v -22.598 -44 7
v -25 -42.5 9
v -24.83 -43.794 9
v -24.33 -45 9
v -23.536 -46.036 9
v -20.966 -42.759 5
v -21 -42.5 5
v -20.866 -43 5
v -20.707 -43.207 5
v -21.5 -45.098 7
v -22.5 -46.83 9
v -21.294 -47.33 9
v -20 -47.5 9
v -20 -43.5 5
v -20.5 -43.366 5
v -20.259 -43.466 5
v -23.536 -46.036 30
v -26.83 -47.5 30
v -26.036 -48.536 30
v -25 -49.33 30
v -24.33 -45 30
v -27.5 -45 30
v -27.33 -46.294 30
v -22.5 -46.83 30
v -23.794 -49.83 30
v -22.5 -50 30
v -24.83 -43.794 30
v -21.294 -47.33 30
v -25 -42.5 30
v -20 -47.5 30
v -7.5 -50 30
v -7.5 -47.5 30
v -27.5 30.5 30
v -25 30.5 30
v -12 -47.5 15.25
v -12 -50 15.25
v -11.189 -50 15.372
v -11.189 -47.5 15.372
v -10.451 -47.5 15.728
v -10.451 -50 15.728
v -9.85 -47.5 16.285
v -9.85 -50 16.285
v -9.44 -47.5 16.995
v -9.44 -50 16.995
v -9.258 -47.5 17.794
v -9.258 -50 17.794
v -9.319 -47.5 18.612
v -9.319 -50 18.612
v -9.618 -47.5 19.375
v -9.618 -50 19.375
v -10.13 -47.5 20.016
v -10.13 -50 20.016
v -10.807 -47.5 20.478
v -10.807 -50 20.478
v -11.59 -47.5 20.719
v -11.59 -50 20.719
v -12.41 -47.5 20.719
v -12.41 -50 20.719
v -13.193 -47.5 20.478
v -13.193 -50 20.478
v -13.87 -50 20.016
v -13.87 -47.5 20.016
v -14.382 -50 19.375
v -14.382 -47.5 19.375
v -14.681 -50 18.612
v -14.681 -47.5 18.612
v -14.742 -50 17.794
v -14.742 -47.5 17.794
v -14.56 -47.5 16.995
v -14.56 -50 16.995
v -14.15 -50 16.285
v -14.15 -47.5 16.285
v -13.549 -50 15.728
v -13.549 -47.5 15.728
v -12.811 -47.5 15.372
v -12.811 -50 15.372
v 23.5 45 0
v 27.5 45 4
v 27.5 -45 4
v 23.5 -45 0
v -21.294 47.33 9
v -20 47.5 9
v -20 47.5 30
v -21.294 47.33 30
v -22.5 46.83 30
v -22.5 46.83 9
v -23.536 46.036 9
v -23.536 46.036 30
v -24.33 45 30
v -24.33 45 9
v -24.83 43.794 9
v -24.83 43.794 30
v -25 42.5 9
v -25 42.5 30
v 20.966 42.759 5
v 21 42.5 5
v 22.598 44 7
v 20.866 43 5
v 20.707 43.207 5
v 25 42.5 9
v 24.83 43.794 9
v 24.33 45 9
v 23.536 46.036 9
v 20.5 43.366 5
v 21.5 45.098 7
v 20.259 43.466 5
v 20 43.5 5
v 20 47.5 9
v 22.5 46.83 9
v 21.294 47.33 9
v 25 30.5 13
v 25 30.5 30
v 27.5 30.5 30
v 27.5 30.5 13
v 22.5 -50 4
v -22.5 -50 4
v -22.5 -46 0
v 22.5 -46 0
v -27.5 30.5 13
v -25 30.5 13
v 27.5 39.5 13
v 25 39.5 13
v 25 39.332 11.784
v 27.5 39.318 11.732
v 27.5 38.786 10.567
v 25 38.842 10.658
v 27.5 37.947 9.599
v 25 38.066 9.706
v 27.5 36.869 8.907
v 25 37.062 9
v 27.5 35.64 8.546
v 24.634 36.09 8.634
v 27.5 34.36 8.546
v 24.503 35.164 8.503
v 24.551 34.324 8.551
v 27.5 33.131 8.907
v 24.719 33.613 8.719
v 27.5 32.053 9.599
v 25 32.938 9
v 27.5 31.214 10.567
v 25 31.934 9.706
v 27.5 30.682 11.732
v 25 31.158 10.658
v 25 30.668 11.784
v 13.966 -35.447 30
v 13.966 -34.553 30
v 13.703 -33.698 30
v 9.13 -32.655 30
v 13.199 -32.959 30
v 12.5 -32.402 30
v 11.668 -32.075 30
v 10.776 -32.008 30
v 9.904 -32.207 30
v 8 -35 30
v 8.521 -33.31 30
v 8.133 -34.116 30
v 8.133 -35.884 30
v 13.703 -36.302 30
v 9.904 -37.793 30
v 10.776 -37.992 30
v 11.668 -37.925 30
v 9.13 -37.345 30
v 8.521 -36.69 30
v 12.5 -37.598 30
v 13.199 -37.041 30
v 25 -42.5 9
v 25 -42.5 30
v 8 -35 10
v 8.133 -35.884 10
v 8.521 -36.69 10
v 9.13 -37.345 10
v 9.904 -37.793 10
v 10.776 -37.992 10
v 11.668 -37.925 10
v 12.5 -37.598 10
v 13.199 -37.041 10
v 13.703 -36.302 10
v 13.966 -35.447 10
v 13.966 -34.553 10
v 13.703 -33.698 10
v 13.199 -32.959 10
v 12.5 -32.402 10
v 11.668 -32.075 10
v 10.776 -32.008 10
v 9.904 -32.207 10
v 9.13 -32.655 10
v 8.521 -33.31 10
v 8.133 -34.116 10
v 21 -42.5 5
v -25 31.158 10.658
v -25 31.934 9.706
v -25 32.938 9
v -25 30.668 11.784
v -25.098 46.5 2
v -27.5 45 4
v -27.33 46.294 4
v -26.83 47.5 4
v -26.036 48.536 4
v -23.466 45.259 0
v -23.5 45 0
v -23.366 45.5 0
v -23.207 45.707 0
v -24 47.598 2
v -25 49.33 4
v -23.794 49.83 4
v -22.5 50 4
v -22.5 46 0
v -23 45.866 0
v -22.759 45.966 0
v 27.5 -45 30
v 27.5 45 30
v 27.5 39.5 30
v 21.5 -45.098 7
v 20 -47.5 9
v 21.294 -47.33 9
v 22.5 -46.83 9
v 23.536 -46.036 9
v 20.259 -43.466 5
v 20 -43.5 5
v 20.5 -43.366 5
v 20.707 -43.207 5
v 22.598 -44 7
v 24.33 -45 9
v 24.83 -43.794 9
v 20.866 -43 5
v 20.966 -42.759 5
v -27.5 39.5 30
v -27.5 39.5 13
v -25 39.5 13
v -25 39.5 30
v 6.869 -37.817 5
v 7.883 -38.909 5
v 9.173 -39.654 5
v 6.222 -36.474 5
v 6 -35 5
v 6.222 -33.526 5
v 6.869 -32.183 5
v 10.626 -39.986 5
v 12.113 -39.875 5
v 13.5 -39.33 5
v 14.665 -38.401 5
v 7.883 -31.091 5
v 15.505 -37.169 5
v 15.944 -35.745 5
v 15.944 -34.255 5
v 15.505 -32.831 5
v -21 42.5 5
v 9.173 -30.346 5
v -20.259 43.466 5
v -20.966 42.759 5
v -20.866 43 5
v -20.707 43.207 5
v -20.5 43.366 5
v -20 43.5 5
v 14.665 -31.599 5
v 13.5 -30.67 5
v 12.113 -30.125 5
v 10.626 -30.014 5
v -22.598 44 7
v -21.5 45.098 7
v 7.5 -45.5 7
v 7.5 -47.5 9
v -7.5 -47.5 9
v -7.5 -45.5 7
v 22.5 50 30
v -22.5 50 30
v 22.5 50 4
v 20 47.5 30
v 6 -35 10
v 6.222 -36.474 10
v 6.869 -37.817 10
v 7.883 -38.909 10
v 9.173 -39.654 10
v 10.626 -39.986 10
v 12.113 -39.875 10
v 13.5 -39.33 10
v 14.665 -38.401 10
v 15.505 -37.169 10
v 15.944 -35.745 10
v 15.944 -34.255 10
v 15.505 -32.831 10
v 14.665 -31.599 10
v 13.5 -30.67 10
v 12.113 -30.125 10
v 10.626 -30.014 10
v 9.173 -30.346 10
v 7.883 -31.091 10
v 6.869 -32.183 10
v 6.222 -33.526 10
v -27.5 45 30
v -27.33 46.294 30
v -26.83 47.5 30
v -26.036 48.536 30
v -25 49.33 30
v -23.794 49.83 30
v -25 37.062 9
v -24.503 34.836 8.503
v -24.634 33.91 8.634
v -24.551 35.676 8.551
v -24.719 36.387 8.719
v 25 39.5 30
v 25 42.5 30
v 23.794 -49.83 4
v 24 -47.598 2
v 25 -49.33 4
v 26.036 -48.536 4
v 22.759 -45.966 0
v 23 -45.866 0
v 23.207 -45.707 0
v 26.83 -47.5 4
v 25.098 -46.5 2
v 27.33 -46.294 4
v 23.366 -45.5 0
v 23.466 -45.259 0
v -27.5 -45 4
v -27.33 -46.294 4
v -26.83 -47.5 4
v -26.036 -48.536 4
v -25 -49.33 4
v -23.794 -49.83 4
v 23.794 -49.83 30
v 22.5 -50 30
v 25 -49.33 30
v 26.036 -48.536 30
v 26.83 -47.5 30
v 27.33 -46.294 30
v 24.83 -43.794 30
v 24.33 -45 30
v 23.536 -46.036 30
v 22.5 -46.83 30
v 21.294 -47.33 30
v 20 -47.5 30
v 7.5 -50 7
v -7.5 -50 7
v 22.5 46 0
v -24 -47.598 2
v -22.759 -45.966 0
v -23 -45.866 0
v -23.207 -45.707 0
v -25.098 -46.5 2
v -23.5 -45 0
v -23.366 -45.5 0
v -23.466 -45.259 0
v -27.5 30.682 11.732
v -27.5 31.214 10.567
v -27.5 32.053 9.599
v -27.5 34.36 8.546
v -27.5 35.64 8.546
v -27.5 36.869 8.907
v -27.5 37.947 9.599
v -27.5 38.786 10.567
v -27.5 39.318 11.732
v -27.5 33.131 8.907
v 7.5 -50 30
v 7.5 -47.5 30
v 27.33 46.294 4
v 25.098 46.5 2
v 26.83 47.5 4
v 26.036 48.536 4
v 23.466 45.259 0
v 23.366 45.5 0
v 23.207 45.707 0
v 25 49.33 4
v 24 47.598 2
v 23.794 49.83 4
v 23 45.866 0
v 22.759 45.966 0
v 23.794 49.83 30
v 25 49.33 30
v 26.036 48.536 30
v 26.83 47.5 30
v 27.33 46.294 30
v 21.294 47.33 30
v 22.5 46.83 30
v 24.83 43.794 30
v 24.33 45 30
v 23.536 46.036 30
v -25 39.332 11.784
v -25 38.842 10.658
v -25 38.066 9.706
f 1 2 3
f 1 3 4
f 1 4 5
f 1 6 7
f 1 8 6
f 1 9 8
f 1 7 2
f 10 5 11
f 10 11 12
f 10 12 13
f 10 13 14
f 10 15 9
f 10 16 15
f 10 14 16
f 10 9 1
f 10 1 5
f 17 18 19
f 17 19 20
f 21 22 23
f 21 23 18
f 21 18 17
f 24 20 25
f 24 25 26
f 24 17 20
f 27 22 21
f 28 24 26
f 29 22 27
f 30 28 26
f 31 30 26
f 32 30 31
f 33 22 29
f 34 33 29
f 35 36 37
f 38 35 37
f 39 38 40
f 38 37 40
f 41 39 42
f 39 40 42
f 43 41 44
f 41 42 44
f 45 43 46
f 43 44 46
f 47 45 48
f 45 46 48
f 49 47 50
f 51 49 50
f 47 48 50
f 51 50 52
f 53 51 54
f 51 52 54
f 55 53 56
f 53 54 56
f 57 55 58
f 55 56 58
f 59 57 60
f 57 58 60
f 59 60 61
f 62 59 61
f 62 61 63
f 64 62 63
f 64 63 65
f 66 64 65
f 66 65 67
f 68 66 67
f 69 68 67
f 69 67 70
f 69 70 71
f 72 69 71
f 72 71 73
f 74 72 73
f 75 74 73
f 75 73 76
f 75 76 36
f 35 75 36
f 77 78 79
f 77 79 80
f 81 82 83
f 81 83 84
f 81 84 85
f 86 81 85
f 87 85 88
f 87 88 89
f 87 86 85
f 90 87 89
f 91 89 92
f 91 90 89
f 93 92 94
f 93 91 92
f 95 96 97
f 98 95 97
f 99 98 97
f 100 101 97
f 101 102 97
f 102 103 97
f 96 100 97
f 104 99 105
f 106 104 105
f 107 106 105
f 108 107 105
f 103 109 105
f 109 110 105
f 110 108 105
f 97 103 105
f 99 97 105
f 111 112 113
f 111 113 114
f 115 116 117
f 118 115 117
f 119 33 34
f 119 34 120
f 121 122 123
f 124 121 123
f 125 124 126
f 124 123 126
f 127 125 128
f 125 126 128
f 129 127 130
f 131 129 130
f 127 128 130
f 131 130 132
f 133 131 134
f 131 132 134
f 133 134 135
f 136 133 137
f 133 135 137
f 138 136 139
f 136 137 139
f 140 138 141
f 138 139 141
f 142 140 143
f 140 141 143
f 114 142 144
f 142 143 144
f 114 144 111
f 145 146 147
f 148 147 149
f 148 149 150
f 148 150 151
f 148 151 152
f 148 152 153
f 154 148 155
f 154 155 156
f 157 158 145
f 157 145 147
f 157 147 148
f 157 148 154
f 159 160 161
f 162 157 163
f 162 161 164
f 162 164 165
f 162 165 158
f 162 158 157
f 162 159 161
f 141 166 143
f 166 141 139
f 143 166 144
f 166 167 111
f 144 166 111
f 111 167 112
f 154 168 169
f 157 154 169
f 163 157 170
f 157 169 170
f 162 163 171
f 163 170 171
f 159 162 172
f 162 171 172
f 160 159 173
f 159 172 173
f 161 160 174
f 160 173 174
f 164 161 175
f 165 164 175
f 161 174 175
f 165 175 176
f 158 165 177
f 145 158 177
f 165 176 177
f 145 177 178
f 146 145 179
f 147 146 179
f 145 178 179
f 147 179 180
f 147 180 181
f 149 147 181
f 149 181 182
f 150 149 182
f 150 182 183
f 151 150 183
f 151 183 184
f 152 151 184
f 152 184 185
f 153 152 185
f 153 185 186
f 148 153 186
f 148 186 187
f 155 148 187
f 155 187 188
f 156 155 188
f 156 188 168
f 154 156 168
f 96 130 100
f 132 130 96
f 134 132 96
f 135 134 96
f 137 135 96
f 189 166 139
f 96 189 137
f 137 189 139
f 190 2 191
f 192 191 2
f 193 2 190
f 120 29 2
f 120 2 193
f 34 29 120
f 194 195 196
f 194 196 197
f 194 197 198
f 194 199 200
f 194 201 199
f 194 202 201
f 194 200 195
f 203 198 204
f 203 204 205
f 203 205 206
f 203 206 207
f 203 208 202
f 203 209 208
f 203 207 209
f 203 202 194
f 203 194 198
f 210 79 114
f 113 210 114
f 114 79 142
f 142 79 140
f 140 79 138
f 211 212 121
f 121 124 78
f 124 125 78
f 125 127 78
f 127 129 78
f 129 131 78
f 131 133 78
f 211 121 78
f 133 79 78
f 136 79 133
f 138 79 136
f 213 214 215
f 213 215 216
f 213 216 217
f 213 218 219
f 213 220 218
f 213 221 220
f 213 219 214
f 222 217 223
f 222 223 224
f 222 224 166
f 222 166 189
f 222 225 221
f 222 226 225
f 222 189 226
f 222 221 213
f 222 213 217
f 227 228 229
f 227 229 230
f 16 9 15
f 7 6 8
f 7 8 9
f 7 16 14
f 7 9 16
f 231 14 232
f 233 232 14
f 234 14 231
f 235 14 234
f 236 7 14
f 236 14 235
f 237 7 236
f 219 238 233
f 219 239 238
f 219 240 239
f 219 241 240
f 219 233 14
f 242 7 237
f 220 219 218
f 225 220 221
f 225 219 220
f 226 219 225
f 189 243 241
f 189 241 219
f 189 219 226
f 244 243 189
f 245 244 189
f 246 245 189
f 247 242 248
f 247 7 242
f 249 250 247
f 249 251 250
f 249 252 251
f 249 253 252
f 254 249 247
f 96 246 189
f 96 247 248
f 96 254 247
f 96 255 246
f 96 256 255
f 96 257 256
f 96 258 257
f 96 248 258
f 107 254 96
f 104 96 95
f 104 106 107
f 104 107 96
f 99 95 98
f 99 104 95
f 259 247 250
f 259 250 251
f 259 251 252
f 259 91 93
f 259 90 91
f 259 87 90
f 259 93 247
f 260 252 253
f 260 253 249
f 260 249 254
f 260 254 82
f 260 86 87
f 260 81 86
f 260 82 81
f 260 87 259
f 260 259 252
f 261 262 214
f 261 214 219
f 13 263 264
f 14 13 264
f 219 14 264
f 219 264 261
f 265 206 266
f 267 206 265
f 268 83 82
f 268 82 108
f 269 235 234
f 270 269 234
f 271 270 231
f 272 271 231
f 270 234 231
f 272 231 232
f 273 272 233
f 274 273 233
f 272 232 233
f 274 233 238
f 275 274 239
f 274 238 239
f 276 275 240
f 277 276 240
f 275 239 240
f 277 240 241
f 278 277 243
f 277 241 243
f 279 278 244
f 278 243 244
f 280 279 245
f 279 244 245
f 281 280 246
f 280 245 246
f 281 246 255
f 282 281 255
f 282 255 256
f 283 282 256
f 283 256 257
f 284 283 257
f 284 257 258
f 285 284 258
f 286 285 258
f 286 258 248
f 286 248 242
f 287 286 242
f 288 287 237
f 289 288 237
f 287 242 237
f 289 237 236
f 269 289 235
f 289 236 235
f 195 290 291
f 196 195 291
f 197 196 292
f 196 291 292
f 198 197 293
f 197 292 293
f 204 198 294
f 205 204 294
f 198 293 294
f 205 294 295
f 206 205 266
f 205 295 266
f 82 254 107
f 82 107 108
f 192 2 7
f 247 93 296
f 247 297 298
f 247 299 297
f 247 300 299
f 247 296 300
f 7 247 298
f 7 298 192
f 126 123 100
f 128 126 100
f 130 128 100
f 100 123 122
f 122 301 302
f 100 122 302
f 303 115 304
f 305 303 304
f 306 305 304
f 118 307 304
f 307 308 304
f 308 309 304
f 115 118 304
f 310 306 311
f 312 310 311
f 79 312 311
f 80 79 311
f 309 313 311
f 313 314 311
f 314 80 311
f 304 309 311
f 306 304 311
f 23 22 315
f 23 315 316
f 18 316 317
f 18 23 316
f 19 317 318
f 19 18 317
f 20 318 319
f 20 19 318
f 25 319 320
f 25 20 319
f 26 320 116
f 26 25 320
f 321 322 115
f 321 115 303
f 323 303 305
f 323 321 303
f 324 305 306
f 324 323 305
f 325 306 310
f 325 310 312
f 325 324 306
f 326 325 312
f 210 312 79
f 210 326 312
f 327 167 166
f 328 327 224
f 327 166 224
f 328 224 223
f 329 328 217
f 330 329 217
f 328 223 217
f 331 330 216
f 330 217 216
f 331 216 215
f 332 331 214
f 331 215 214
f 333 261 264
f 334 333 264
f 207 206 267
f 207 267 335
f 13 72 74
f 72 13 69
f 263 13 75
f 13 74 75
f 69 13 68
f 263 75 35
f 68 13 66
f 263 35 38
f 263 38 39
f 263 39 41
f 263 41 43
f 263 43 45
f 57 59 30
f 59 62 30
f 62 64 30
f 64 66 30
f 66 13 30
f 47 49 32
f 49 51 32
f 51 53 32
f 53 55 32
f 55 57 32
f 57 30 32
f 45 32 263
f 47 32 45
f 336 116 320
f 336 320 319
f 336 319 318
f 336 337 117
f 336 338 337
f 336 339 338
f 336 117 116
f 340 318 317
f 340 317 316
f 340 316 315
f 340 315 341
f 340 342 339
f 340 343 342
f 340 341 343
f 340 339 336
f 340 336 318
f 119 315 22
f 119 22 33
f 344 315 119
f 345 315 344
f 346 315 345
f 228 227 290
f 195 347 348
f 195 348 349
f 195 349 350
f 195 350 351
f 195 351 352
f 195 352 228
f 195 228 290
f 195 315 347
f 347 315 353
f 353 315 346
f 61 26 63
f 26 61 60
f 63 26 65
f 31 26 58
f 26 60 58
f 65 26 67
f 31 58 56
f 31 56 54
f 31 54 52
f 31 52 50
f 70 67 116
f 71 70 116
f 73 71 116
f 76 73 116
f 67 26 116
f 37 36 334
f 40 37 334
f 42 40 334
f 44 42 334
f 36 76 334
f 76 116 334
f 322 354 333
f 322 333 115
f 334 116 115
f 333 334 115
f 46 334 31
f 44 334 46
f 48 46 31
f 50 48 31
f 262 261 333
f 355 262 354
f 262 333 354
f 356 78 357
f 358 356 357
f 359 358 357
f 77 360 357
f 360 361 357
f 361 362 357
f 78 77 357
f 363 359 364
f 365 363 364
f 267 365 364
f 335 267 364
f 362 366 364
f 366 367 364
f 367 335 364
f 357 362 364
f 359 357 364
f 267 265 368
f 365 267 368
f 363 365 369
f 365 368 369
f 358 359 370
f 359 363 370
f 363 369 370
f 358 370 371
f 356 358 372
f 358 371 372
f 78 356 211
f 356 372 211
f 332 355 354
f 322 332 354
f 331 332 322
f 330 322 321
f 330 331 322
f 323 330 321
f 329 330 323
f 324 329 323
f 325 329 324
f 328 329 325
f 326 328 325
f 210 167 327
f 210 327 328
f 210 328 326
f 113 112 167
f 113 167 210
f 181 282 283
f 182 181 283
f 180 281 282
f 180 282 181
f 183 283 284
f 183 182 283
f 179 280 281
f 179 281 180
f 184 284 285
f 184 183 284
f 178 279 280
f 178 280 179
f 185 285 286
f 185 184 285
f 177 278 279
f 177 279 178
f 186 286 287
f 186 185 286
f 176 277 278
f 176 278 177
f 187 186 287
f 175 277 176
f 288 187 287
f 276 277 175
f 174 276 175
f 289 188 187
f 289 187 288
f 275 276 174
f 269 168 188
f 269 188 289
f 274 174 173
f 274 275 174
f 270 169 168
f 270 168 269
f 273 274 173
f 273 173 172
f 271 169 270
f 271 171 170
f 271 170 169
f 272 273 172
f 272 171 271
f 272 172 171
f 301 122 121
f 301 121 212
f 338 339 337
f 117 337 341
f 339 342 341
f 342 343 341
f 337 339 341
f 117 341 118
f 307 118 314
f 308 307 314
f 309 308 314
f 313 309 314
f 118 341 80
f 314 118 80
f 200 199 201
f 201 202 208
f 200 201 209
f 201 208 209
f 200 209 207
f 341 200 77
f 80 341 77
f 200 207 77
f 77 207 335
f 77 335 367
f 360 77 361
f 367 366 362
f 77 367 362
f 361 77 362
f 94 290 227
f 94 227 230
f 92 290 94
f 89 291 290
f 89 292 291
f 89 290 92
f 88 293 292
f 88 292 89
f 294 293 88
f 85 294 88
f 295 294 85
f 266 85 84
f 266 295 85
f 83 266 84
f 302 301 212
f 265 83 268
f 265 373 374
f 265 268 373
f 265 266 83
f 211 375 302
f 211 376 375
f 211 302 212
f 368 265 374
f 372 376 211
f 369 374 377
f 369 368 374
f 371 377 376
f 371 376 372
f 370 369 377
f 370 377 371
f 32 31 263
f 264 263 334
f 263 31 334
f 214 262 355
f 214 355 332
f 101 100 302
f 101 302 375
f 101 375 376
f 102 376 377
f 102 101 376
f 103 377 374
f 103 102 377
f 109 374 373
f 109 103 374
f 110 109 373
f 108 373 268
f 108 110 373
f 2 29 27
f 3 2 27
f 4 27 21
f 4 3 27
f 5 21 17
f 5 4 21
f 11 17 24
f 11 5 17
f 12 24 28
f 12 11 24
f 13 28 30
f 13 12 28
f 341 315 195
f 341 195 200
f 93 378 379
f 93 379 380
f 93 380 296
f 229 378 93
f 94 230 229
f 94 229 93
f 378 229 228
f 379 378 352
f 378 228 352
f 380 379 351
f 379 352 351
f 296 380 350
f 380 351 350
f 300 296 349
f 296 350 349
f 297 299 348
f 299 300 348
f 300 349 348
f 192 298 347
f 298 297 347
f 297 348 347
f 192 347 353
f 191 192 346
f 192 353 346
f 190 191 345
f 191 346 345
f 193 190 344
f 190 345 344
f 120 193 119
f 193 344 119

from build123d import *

# Parameters (mm, degrees)
SKETCH_1_W          = 55
SKETCH_1_H          = 100
EXTRUDE_1_DEPTH     = 30
CUT_EXTRUDE_1_DEPTH = 81.156097709
SKETCH_3_W          = 50
SKETCH_3_H          = 95
CUT_EXTRUDE_2_DEPTH = 25
FILLET_1_R          = 5
SKETCH_5_R          = 3
EXTRUDE_2_DEPTH     = 25
SKETCH_6_W          = 15
SKETCH_6_H          = 23
CUT_EXTRUDE_4_DEPTH = 5
CHAMFER_1_SIZE      = 4
SKETCH_7_R          = 5
EXTRUDE_3_DEPTH     = 5
SKETCH_8_R          = 2.75
CUT_EXTRUDE_5_DEPTH = 5


with BuildPart() as part:
    # 草圖1 → 填料-伸長1 (new body)
    with BuildSketch(Plane.XY):
        Rectangle(SKETCH_1_W, SKETCH_1_H)
    extrude(amount=EXTRUDE_1_DEPTH)

    # 草圖2 → 除料-伸長1 (cut, through all)
    with BuildSketch(Plane.ZY.offset(27.5)):
        with BuildLine():
            Line((13, 39.5), (30, 39.5))
            Line((30, 39.5), (30, 30.5))
            Line((30, 30.5), (13, 30.5))
            ThreePointArc((13, 30.5), (8.5, 35), (13, 39.5))
        make_face()
    extrude(amount=-CUT_EXTRUDE_1_DEPTH, mode=Mode.SUBTRACT)

    # 草圖3 → 除料-伸長2 (cut)
    with BuildSketch(Plane.XY.offset(30)):
        Rectangle(SKETCH_3_W, SKETCH_3_H)
    extrude(amount=-CUT_EXTRUDE_2_DEPTH, mode=Mode.SUBTRACT)

    # 圓角1
    fillet_1_edges = [part.edges().sort_by_distance(p)[0] for p in [
        (25, 47.5, 17.5),
        (-25, -47.5, 17.5),
        (25, -47.5, 17.5),
        (-25, 47.5, 17.5),
        (27.5, -50, 15),
        (-27.5, -50, 15),
        (-27.5, 50, 15),
        (27.5, 50, 15),
    ]]
    fillet(fillet_1_edges, radius=FILLET_1_R)

    # 草圖5 → 填料-伸長2 (add)
    with BuildSketch(Plane.XY.offset(5)):
        with Locations(Location((11, -35, 0), (0, 0, 180))):
            Circle(SKETCH_5_R)
    extrude(amount=EXTRUDE_2_DEPTH)

    # 草圖6 → 除料-伸長4 (cut)
    with BuildSketch(Plane.XZ.offset(50)):
        with Locations((0, 18.5)):
            Rectangle(SKETCH_6_W, SKETCH_6_H)
    extrude(amount=-CUT_EXTRUDE_4_DEPTH, mode=Mode.SUBTRACT)

    # 導角1
    # the kernel refuses this chamfer: 4 mm, written as the material it adds along each edge
    with BuildSketch(Plane(origin=(-20, -42.5, 5), x_dir=(-1, 0, 0), z_dir=(0, 1, 0))) as chamfer_1_piece_1:
        Polygon((5, CHAMFER_1_SIZE), (5 - CHAMFER_1_SIZE, 0), (5, 0), align=None)
    revolve(axis=Axis((-20, -42.5, 5), (0, 0, 1)), revolution_arc=90)
    with BuildSketch(Plane(origin=(-25, 42.5, 5), x_dir=(-0.027495876610586487, 0, 0.9996219169112968), z_dir=(0, -1, 0))) as chamfer_1_piece_2_section:
        Polygon((CHAMFER_1_SIZE * 0.999621916911, -CHAMFER_1_SIZE * 0.0274958766106), (-CHAMFER_1_SIZE * 0.0274958766106, -CHAMFER_1_SIZE * 0.999621916911), (0, 0), align=None)
    chamfer_1_piece_2 = extrude(amount=85, mode=Mode.PRIVATE)
    chamfer_1_piece_2 = chamfer_1_piece_2 - Plane(origin=(-23.679821879, 35, 13), x_dir=(0, -1, 0), z_dir=(-1, 0, 0)) * Cylinder(4.5, 186, mode=Mode.PRIVATE)
    add(chamfer_1_piece_2)
    with BuildSketch(Plane(origin=(-20, 42.5, 5), x_dir=(-1, 0, 0), z_dir=(0, -1, 0))) as chamfer_1_piece_3:
        Polygon((5 - CHAMFER_1_SIZE, 0), (5, -CHAMFER_1_SIZE), (5, 0), align=None)
    revolve(axis=Axis((-20, 42.5, 5), (0, 0, -1)), revolution_arc=90)
    with BuildSketch(Plane(origin=(20, 47.5, 5), x_dir=(0, -0.9996219169112968, -0.027495876610586296), z_dir=(-1, 0, 0))) as chamfer_1_piece_4:
        Polygon((CHAMFER_1_SIZE * 0.999621916911, CHAMFER_1_SIZE * 0.0274958766106), (-CHAMFER_1_SIZE * 0.0274958766106, CHAMFER_1_SIZE * 0.999621916911), (0, 0), align=None)
    extrude(amount=40)
    with BuildSketch(Plane(origin=(20, 42.5, 5), x_dir=(1, 0, 0), z_dir=(0, -1, 0))) as chamfer_1_piece_5:
        Polygon((5 - CHAMFER_1_SIZE, 0), (5, CHAMFER_1_SIZE), (5, 0), align=None)
    revolve(axis=Axis((20, 42.5, 5), (0, 0, 1)), revolution_arc=90)
    with BuildSketch(Plane(origin=(25, -42.5, 5), x_dir=(0.027495876610586487, 0, 0.9996219169112968), z_dir=(0, 1, 0))) as chamfer_1_piece_6_section:
        Polygon((CHAMFER_1_SIZE * 0.999621916911, -CHAMFER_1_SIZE * 0.0274958766106), (-CHAMFER_1_SIZE * 0.0274958766106, -CHAMFER_1_SIZE * 0.999621916911), (0, 0), align=None)
    chamfer_1_piece_6 = extrude(amount=85, mode=Mode.PRIVATE)
    chamfer_1_piece_6 = chamfer_1_piece_6 - Plane(origin=(23.679821879, 35, 13), x_dir=(0, -1, 0), z_dir=(-1, 0, 0)) * Cylinder(4.5, 186, mode=Mode.PRIVATE)
    add(chamfer_1_piece_6)
    with BuildSketch(Plane(origin=(20, -42.5, 5), x_dir=(0, -1, 0), z_dir=(-1, 0, 0))) as chamfer_1_piece_7:
        Polygon((5, CHAMFER_1_SIZE), (5 - CHAMFER_1_SIZE, 0), (5, 0), align=None)
    revolve(axis=Axis((20, -42.5, 5), (0, 0, 1)), revolution_arc=90)
    with BuildSketch(Plane(origin=(-20, -47.5, 5), x_dir=(0, -0.027495876610585623, 0.9996219169112968), z_dir=(1, 0, 0))) as chamfer_1_piece_8_section:
        Polygon((CHAMFER_1_SIZE * 0.999621916911, -CHAMFER_1_SIZE * 0.0274958766106), (-CHAMFER_1_SIZE * 0.0274958766106, -CHAMFER_1_SIZE * 0.999621916911), (0, 0), align=None)
    chamfer_1_piece_8 = extrude(amount=40, mode=Mode.PRIVATE)
    chamfer_1_piece_8 = split(chamfer_1_piece_8, bisect_by=Plane(origin=(-13.75, -46.917717373, 7), z_dir=(0, 0, 1)), keep=Keep.TOP, mode=Mode.PRIVATE)
    chamfer_1_piece_8 = split(chamfer_1_piece_8, bisect_by=Plane(origin=(-7.5, -46.917717373, 7.727438446), z_dir=(-1, 0, 0)), keep=Keep.TOP, mode=Mode.PRIVATE)
    add(chamfer_1_piece_8)
    with BuildSketch(Plane(origin=(-20, -47.5, 5), x_dir=(0, -0.027495876610585623, 0.9996219169112968), z_dir=(1, 0, 0))) as chamfer_1_piece_9_section:
        Polygon((CHAMFER_1_SIZE * 0.999621916911, -CHAMFER_1_SIZE * 0.0274958766106), (-CHAMFER_1_SIZE * 0.0274958766106, -CHAMFER_1_SIZE * 0.999621916911), (0, 0), align=None)
    chamfer_1_piece_9 = extrude(amount=40, mode=Mode.PRIVATE)
    chamfer_1_piece_9 = split(chamfer_1_piece_9, bisect_by=Plane(origin=(-13.75, -45.926395663, 7), z_dir=(0, 0, -1)), keep=Keep.TOP, mode=Mode.PRIVATE)
    chamfer_1_piece_9 = split(chamfer_1_piece_9, bisect_by=Plane(origin=(-7.5, -45.926395663, 5.832937159), z_dir=(-1, 0, 0)), keep=Keep.TOP, mode=Mode.PRIVATE)
    add(chamfer_1_piece_9)
    with BuildSketch(Plane(origin=(-20, -47.5, 5), x_dir=(0, -0.027495876610585623, 0.9996219169112968), z_dir=(1, 0, 0))) as chamfer_1_piece_10_section:
        Polygon((CHAMFER_1_SIZE * 0.999621916911, -CHAMFER_1_SIZE * 0.0274958766106), (-CHAMFER_1_SIZE * 0.0274958766106, -CHAMFER_1_SIZE * 0.999621916911), (0, 0), align=None)
    chamfer_1_piece_10 = extrude(amount=40, mode=Mode.PRIVATE)
    chamfer_1_piece_10 = split(chamfer_1_piece_10, bisect_by=Plane(origin=(7.5, -45.926395663, 5.832937159), z_dir=(-1, 0, 0)), keep=Keep.TOP, mode=Mode.PRIVATE)
    chamfer_1_piece_10 = split(chamfer_1_piece_10, bisect_by=Plane(origin=(0, -45.926395663, 7), z_dir=(0, 0, -1)), keep=Keep.TOP, mode=Mode.PRIVATE)
    chamfer_1_piece_10 = split(chamfer_1_piece_10, bisect_by=Plane(origin=(-7.5, -45.926395663, 5.832937159), z_dir=(1, 0, 0)), keep=Keep.TOP, mode=Mode.PRIVATE)
    add(chamfer_1_piece_10)
    with BuildSketch(Plane(origin=(-20, -47.5, 5), x_dir=(0, -0.027495876610585623, 0.9996219169112968), z_dir=(1, 0, 0))) as chamfer_1_piece_11_section:
        Polygon((CHAMFER_1_SIZE * 0.999621916911, -CHAMFER_1_SIZE * 0.0274958766106), (-CHAMFER_1_SIZE * 0.0274958766106, -CHAMFER_1_SIZE * 0.999621916911), (0, 0), align=None)
    chamfer_1_piece_11 = extrude(amount=40, mode=Mode.PRIVATE)
    chamfer_1_piece_11 = split(chamfer_1_piece_11, bisect_by=Plane(origin=(7.5, -46.917717373, 7.727438446), z_dir=(1, 0, 0)), keep=Keep.TOP, mode=Mode.PRIVATE)
    chamfer_1_piece_11 = split(chamfer_1_piece_11, bisect_by=Plane(origin=(13.75, -46.917717373, 7), z_dir=(0, 0, 1)), keep=Keep.TOP, mode=Mode.PRIVATE)
    add(chamfer_1_piece_11)
    with BuildSketch(Plane(origin=(-20, -47.5, 5), x_dir=(0, -0.027495876610585623, 0.9996219169112968), z_dir=(1, 0, 0))) as chamfer_1_piece_12_section:
        Polygon((CHAMFER_1_SIZE * 0.999621916911, -CHAMFER_1_SIZE * 0.0274958766106), (-CHAMFER_1_SIZE * 0.0274958766106, -CHAMFER_1_SIZE * 0.999621916911), (0, 0), align=None)
    chamfer_1_piece_12 = extrude(amount=40, mode=Mode.PRIVATE)
    chamfer_1_piece_12 = split(chamfer_1_piece_12, bisect_by=Plane(origin=(7.5, -45.926395663, 5.832937159), z_dir=(1, 0, 0)), keep=Keep.TOP, mode=Mode.PRIVATE)
    chamfer_1_piece_12 = split(chamfer_1_piece_12, bisect_by=Plane(origin=(13.75, -45.926395663, 7), z_dir=(0, 0, -1)), keep=Keep.TOP, mode=Mode.PRIVATE)
    add(chamfer_1_piece_12)
    # the kernel refuses this chamfer: 4 mm, written as the material it takes off along each edge
    with BuildSketch(Plane(origin=(-27.5, 45, 0), x_dir=(-0.027495876610586494, 0, 0.9996219169112968), z_dir=(0, -1, 0)), Plane(origin=(27.5, -45, 0), x_dir=(0.027495876610586494, 0, 0.9996219169112968), z_dir=(0, 1, 0))) as chamfer_1_2_piece_1:
        Polygon((CHAMFER_1_SIZE * 0.999621916911, -CHAMFER_1_SIZE * 0.0274958766106), (-CHAMFER_1_SIZE * 0.0274958766106, -CHAMFER_1_SIZE * 0.999621916911), (0, 0), align=None)
    extrude(amount=90, mode=Mode.SUBTRACT)
    with BuildSketch(Plane(origin=(-22.5, -45, 0), x_dir=(0, -1, 0), z_dir=(1, 0, 0))) as chamfer_1_2_piece_2:
        Polygon((5, -CHAMFER_1_SIZE), (5 - CHAMFER_1_SIZE, 0), (5, 0), align=None)
    revolve(axis=Axis((-22.5, -45, 0), (0, 0, -1)), revolution_arc=90, mode=Mode.SUBTRACT)
    with BuildSketch(Plane(origin=(-22.5, 45, 0), x_dir=(-1, 0, 0), z_dir=(0, -1, 0))) as chamfer_1_2_piece_3:
        Polygon((5, -CHAMFER_1_SIZE), (5 - CHAMFER_1_SIZE, 0), (5, 0), align=None)
    revolve(axis=Axis((-22.5, 45, 0), (0, 0, -1)), revolution_arc=90, mode=Mode.SUBTRACT)
    with BuildSketch(Plane(origin=(-22.5, -50, 0), x_dir=(0, -0.02749587661058563, 0.9996219169112968), z_dir=(1, 0, 0)), Plane(origin=(22.5, 50, 0), x_dir=(0, 0.02749587661058563, 0.9996219169112968), z_dir=(-1, 0, 0))) as chamfer_1_2_piece_4:
        Polygon((CHAMFER_1_SIZE * 0.999621916911, -CHAMFER_1_SIZE * 0.0274958766106), (-CHAMFER_1_SIZE * 0.0274958766106, -CHAMFER_1_SIZE * 0.999621916911), (0, 0), align=None)
    extrude(amount=45, mode=Mode.SUBTRACT)
    with BuildSketch(Plane(origin=(22.5, -45, 0), x_dir=(0, -1, 0), z_dir=(-1, 0, 0))) as chamfer_1_2_piece_5:
        Polygon((5, CHAMFER_1_SIZE), (5 - CHAMFER_1_SIZE, 0), (5, 0), align=None)
    revolve(axis=Axis((22.5, -45, 0), (0, 0, 1)), revolution_arc=90, mode=Mode.SUBTRACT)
    with BuildSketch(Plane(origin=(22.5, 45, 0), x_dir=(1, 0, 0), z_dir=(0, -1, 0))) as chamfer_1_2_piece_6:
        Polygon((5, CHAMFER_1_SIZE), (5 - CHAMFER_1_SIZE, 0), (5, 0), align=None)
    revolve(axis=Axis((22.5, 45, 0), (0, 0, 1)), revolution_arc=90, mode=Mode.SUBTRACT)

    # 草圖7 → 填料-伸長3 (add)
    with BuildSketch(Plane.XY.offset(5)):
        with Locations(Location((11, -35, 0), (0, 0, 180))):
            Circle(SKETCH_7_R)
    extrude(amount=EXTRUDE_3_DEPTH)

    # 草圖8 → 除料-伸長5 (cut)
    with BuildSketch(Plane.XZ.offset(50)):
        with Locations(Location((-12, 18, 0), (0, 0, 270))):
            Circle(SKETCH_8_R)
    extrude(amount=-CUT_EXTRUDE_5_DEPTH, mode=Mode.SUBTRACT)


solid = part.part
